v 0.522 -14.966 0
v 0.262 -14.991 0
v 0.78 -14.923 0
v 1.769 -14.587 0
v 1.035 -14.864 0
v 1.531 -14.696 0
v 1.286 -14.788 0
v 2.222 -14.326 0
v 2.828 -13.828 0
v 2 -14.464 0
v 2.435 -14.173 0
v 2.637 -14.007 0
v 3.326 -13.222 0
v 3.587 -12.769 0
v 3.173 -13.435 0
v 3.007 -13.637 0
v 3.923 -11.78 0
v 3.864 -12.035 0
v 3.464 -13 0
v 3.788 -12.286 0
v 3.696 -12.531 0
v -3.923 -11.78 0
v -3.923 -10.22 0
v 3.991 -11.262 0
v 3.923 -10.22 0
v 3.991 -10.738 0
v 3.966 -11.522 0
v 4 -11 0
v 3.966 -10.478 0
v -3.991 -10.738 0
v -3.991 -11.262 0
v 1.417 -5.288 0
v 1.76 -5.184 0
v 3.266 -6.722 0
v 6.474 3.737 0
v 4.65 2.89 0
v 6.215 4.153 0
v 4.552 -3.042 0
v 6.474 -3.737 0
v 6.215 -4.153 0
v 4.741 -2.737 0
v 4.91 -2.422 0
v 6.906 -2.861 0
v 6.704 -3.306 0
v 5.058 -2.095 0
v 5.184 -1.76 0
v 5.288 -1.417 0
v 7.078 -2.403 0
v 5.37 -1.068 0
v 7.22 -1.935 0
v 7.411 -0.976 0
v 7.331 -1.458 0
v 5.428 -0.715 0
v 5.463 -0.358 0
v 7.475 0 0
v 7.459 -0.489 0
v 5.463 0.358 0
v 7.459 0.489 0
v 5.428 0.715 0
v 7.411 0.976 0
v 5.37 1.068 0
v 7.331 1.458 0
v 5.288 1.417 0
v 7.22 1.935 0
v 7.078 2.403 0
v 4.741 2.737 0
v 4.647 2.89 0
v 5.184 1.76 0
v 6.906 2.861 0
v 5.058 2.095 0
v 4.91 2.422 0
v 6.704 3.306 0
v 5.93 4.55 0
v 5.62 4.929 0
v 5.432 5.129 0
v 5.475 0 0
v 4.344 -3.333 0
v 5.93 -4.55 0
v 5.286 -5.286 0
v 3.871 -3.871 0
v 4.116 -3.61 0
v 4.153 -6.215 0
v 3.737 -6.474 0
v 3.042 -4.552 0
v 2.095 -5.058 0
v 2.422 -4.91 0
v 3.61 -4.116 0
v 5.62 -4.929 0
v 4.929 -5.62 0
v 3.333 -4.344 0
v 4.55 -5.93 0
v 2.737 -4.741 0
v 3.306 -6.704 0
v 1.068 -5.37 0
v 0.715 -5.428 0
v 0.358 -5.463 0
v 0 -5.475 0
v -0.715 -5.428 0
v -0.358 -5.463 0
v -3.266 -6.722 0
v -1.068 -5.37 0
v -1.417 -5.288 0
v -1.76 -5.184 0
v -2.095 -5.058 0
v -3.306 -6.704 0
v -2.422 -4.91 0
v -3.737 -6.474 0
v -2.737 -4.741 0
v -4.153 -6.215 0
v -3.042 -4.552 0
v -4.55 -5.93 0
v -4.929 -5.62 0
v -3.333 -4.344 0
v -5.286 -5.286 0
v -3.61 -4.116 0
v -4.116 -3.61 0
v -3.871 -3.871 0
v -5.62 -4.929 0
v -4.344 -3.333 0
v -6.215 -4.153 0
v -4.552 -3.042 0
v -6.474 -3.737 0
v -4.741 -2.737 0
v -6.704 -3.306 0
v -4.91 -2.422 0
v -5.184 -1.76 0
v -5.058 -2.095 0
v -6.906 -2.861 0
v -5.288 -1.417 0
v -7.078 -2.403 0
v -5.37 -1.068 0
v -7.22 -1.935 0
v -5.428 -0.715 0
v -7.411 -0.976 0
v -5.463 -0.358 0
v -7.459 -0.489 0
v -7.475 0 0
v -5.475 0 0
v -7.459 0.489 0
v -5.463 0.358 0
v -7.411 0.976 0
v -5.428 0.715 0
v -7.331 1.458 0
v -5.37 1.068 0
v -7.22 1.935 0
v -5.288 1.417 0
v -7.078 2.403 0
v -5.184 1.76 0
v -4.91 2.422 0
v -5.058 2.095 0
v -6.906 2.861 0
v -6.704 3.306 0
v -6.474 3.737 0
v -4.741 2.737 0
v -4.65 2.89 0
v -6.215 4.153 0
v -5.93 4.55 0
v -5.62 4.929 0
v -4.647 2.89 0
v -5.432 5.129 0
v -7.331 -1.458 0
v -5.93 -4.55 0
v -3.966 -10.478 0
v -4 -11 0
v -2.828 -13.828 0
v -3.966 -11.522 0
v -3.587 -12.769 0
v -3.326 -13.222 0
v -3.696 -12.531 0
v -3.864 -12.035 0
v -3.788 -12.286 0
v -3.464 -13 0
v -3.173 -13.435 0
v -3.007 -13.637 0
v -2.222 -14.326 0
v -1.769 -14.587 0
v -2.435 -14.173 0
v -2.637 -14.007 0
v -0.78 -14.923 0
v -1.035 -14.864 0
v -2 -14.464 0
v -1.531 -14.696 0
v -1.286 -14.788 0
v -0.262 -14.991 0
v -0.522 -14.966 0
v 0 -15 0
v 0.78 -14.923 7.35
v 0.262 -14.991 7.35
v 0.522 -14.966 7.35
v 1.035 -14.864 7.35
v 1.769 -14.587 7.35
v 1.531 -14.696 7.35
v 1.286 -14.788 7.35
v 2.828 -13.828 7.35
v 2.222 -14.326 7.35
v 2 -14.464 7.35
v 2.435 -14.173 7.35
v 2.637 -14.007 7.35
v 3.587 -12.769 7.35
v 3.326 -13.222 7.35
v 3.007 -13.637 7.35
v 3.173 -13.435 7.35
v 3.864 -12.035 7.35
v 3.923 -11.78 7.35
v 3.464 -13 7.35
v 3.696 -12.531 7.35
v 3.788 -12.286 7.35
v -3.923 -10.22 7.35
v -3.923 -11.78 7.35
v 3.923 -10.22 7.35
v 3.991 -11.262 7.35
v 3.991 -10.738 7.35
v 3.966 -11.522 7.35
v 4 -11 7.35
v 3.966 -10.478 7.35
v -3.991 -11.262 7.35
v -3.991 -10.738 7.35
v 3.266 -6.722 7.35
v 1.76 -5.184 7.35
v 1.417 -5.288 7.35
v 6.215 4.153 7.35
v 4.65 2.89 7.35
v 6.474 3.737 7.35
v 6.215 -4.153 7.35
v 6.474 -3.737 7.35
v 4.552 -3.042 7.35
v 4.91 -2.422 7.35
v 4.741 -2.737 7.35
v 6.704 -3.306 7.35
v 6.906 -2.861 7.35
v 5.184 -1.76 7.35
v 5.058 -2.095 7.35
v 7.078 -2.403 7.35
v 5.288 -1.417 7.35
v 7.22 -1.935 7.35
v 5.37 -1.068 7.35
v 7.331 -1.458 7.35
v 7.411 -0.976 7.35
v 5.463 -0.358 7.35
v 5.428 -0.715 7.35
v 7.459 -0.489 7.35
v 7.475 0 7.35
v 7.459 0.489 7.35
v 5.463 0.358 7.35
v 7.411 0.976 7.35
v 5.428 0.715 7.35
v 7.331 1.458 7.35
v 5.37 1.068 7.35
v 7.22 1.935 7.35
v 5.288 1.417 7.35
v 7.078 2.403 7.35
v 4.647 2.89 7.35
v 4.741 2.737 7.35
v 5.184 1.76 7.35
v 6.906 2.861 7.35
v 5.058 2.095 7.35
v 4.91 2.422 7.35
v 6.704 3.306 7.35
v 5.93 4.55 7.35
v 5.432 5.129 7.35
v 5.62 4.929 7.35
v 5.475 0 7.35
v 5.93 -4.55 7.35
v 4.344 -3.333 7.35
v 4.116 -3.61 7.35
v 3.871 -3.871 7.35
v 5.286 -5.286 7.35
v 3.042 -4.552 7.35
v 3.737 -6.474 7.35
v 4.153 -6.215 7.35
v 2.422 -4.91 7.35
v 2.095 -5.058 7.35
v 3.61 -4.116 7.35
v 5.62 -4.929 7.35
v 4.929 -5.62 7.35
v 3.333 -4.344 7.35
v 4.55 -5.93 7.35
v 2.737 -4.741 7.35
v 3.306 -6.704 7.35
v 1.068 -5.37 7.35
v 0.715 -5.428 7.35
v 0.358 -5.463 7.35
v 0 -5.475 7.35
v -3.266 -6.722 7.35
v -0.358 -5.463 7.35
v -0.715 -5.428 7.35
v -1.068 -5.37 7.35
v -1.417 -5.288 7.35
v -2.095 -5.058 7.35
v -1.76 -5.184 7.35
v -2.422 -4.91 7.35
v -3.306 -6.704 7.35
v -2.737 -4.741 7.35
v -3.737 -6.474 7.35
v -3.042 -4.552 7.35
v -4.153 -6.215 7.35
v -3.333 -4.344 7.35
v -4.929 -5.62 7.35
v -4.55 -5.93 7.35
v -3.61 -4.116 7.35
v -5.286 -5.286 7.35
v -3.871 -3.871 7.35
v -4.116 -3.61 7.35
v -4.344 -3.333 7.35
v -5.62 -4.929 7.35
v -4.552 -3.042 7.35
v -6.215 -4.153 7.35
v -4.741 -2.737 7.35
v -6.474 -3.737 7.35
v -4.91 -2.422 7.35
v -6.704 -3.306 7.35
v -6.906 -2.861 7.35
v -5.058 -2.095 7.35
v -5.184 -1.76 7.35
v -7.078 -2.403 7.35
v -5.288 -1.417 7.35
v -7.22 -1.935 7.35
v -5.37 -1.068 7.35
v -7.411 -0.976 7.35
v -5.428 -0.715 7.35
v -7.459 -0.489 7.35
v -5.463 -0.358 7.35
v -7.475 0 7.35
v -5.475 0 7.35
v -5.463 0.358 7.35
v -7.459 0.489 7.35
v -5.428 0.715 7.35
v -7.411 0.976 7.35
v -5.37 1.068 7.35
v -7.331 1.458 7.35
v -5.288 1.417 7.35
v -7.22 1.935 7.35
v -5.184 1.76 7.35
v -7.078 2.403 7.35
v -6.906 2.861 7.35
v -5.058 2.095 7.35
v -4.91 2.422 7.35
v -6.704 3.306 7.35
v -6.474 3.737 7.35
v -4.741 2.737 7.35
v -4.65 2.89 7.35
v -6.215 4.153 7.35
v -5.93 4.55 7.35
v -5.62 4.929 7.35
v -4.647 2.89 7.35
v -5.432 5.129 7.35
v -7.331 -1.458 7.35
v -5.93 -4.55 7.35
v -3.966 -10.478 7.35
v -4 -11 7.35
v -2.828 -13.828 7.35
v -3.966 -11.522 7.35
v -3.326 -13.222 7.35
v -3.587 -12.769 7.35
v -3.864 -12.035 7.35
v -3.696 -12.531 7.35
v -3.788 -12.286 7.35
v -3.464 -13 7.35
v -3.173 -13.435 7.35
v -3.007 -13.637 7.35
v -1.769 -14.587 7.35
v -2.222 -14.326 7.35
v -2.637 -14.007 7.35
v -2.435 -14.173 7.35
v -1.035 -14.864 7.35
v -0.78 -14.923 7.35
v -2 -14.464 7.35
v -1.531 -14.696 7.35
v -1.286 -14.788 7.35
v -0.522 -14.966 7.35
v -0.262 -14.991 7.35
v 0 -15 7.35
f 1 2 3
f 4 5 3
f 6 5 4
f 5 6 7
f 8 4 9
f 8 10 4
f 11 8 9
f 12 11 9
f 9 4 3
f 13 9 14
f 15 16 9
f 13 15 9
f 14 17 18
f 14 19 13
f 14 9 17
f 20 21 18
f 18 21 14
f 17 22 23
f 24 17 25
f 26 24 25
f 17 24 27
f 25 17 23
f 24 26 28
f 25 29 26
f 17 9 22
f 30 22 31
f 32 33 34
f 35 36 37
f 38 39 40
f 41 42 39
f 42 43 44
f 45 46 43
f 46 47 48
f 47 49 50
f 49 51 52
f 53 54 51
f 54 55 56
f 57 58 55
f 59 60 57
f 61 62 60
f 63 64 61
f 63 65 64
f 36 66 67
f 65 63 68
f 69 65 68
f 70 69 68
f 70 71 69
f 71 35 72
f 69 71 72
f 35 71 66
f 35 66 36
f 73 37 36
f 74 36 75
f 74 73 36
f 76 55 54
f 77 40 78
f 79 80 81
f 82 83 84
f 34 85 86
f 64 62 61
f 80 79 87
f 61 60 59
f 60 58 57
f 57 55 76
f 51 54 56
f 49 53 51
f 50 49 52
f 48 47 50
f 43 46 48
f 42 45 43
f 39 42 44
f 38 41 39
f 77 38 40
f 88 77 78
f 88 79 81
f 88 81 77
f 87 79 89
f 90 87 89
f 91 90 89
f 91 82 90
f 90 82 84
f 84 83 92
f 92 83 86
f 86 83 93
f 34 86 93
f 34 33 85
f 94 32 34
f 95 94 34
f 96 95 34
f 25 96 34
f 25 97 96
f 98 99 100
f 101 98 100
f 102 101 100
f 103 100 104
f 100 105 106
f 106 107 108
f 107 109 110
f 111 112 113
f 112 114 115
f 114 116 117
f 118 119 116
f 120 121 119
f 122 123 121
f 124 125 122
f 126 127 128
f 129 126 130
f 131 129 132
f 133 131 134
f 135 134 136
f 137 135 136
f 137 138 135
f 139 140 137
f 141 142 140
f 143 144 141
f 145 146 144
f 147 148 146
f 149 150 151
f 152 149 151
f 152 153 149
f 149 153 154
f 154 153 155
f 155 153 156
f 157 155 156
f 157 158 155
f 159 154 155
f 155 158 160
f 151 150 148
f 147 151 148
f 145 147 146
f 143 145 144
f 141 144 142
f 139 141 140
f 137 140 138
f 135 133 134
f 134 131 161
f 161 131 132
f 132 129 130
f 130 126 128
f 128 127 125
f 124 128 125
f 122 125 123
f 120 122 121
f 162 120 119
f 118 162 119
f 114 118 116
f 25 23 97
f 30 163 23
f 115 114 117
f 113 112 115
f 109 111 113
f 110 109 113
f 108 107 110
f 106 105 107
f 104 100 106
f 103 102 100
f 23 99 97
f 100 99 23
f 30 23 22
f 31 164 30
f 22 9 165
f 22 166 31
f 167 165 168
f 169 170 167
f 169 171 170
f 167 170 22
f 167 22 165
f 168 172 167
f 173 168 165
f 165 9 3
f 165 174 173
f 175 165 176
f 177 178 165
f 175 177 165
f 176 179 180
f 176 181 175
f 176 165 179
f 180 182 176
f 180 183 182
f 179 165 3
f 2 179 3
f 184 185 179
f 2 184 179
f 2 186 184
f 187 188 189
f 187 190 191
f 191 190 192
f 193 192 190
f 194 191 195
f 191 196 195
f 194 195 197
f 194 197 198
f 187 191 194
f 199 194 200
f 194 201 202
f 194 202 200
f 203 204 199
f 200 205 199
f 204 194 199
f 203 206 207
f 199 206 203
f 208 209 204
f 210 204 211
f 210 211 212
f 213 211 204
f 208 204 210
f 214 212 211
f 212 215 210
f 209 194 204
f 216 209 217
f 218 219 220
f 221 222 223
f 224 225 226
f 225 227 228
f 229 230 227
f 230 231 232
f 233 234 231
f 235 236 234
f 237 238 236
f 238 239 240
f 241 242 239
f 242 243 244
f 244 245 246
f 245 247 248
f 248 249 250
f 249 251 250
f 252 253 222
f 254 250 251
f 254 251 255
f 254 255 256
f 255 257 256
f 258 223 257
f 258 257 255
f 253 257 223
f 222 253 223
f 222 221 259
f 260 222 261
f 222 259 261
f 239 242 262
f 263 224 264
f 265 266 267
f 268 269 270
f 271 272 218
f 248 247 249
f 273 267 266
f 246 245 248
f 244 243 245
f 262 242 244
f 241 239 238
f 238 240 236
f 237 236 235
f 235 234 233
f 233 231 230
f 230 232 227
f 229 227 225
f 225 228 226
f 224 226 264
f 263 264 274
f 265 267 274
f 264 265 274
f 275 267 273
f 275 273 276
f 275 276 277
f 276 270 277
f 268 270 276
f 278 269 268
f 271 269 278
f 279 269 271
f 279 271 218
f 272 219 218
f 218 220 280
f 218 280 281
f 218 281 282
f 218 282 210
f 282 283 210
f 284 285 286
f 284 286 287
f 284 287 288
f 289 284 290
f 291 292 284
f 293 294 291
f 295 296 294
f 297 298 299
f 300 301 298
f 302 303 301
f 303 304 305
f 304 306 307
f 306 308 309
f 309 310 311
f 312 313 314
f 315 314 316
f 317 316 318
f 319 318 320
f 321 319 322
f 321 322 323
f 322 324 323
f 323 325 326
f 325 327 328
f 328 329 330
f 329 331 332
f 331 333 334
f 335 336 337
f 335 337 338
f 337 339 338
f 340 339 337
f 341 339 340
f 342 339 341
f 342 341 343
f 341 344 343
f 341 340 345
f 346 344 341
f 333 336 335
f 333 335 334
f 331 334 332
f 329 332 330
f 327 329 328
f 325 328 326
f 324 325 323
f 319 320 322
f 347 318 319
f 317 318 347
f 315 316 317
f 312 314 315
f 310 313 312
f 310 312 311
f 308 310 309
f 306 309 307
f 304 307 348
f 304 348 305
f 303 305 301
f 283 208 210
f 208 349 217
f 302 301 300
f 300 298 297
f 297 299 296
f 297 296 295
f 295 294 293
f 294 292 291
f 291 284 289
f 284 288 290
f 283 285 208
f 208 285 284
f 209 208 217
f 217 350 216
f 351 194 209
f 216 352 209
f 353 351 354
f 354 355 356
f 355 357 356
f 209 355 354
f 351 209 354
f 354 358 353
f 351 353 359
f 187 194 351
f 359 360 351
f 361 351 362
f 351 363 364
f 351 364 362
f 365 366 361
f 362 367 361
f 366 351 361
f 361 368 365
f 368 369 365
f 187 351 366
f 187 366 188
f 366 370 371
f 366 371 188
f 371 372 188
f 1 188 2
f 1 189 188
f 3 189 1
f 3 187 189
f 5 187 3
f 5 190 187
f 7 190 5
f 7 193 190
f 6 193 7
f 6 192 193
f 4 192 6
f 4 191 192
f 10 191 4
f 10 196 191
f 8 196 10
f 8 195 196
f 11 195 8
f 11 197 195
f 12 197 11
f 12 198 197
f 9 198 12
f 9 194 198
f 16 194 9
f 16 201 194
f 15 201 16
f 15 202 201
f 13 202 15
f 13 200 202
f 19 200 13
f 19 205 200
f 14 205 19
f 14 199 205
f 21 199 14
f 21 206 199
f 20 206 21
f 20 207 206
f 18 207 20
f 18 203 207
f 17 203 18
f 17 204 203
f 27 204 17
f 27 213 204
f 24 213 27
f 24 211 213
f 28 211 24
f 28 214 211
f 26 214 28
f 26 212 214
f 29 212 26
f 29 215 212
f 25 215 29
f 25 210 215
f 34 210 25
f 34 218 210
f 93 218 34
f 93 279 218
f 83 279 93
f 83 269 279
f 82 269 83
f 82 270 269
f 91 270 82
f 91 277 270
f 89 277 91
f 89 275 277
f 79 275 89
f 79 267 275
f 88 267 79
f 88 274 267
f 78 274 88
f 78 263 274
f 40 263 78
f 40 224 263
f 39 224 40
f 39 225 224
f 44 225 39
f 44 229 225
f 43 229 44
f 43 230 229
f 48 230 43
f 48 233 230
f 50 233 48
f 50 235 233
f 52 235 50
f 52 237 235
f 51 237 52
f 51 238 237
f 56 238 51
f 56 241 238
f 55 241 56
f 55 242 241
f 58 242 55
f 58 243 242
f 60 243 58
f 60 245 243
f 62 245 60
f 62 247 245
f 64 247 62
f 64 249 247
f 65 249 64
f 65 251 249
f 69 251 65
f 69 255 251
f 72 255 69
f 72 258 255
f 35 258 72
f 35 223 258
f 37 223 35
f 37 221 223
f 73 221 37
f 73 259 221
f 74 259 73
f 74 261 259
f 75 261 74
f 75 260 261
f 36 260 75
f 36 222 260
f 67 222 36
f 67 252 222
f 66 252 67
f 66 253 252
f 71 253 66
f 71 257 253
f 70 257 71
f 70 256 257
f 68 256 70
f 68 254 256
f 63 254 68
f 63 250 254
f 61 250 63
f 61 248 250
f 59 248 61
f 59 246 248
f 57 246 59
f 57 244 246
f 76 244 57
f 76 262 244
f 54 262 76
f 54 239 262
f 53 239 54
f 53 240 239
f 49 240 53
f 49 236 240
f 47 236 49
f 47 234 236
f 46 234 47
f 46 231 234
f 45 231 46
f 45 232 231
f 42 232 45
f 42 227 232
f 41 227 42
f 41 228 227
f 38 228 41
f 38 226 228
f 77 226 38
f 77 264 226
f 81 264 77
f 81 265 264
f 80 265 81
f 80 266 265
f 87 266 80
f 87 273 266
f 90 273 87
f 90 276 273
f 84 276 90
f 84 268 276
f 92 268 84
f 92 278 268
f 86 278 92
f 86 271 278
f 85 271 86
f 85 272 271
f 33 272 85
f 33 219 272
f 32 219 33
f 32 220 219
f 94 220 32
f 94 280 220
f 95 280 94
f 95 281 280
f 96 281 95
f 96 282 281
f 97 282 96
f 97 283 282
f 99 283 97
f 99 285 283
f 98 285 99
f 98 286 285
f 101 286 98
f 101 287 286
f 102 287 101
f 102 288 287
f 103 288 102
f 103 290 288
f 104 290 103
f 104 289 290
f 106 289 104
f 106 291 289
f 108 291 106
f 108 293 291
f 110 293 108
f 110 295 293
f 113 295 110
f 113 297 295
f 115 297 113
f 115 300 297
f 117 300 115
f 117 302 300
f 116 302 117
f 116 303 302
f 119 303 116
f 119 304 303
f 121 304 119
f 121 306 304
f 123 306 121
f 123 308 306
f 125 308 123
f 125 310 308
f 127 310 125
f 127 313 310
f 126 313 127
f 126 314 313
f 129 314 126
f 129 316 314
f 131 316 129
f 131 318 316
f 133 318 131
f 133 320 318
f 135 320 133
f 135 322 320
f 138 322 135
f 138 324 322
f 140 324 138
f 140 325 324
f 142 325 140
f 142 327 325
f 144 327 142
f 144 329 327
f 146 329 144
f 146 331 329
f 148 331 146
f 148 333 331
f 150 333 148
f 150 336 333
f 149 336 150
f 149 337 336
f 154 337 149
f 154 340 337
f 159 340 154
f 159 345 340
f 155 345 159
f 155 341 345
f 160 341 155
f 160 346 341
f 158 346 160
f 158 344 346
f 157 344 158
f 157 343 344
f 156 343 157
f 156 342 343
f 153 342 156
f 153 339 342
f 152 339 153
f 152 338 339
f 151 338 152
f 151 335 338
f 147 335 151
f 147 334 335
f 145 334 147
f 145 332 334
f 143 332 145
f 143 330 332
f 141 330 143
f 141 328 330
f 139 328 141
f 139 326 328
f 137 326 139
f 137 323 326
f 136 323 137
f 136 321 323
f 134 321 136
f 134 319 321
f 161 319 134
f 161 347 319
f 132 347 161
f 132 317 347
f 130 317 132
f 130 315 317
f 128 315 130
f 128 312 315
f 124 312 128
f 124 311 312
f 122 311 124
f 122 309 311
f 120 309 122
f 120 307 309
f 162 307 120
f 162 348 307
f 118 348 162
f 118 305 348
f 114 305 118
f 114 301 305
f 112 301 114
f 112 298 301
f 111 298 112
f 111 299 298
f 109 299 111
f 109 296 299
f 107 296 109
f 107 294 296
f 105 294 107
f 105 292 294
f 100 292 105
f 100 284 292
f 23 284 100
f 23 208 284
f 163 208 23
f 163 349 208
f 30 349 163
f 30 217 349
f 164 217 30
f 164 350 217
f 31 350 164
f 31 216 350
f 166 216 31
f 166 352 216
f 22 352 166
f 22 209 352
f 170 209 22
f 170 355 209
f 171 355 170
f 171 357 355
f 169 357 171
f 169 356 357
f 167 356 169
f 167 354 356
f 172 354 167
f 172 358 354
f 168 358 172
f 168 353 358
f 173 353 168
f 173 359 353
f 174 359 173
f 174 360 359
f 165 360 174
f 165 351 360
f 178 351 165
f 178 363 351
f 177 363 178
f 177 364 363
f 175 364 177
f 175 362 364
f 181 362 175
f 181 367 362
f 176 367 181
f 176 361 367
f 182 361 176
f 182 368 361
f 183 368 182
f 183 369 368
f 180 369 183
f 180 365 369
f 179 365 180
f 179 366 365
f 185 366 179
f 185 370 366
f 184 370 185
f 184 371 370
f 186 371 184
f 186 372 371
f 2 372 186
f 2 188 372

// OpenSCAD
// Keg button clip, asymmetric. Snaps sideways onto the button shaft and
// sits under the cap. Button: shaft d10.95, cap d21, height 7.35.
//
// Anti-leverage shape: the collar around the shaft (15mm od) hides
// entirely under the 21mm cap, so the ONLY thing sticking out is one
// rounded paddle opposite the mouth. With a single arm there is no
// opposing lever: bumping a neighboring component can transmit at most
// a direct push, never an amplified torque. Units: mm.

$fn = 96;

shaft_d = 10.95;
bore_d  = shaft_d;  // no margin: tight grip on the shaft
bore_r  = bore_d / 2;
height  = 7.35;     // exactly the button height

throat_w = 9.3;     // opening at the mouth; < shaft_d so the arms snap
wall     = 2.0;     // collar thickness; the two side arcs between the
                    // paddle root and the lips are the springs
neck_r   = 2.8;     // stalk half-width at the collar
paddle_r = 4;       // rounded paddle tip; taper widens toward it so
                    // pulling fingers wedge on instead of slipping off
paddle_y = -11;     // tip center; tip reaches paddle_y - paddle_r.
                    // short on purpose: fingers fit under the cap, the
                    // paddle only needs enough surface to pinch

lip_y     = sqrt(bore_r*bore_r - throat_w*throat_w/4);
collar_or = bore_r + wall;

module body2d() {
    difference() {
        union() {
            circle(collar_or);
            // the one arm: tapered paddle on a narrow neck at the collar
            // bottom, so the side arcs stay free to flex during snap-on
            hull() {
                translate([0, -4.5]) circle(neck_r);
                translate([0, paddle_y]) circle(paddle_r);
            }
        }
        circle(bore_r);
        // mouth: throat at the lips, flared lead-in
        polygon([[-throat_w/2, lip_y], [throat_w/2, lip_y],
                 [6.6, collar_or + 1], [-6.6, collar_or + 1]]);
    }
}

// self-checks against the button's real dimensions
assert(height == 7.35, "height must be exactly the button height");
assert(2*collar_or < 21, "collar must hide under the 21 cap");
assert(-(paddle_y - paddle_r) > 21/2 + 3, "paddle must offer grab surface past the cap");
assert(throat_w < bore_d, "throat must be narrower than bore to latch");

linear_extrude(height) body2d();
